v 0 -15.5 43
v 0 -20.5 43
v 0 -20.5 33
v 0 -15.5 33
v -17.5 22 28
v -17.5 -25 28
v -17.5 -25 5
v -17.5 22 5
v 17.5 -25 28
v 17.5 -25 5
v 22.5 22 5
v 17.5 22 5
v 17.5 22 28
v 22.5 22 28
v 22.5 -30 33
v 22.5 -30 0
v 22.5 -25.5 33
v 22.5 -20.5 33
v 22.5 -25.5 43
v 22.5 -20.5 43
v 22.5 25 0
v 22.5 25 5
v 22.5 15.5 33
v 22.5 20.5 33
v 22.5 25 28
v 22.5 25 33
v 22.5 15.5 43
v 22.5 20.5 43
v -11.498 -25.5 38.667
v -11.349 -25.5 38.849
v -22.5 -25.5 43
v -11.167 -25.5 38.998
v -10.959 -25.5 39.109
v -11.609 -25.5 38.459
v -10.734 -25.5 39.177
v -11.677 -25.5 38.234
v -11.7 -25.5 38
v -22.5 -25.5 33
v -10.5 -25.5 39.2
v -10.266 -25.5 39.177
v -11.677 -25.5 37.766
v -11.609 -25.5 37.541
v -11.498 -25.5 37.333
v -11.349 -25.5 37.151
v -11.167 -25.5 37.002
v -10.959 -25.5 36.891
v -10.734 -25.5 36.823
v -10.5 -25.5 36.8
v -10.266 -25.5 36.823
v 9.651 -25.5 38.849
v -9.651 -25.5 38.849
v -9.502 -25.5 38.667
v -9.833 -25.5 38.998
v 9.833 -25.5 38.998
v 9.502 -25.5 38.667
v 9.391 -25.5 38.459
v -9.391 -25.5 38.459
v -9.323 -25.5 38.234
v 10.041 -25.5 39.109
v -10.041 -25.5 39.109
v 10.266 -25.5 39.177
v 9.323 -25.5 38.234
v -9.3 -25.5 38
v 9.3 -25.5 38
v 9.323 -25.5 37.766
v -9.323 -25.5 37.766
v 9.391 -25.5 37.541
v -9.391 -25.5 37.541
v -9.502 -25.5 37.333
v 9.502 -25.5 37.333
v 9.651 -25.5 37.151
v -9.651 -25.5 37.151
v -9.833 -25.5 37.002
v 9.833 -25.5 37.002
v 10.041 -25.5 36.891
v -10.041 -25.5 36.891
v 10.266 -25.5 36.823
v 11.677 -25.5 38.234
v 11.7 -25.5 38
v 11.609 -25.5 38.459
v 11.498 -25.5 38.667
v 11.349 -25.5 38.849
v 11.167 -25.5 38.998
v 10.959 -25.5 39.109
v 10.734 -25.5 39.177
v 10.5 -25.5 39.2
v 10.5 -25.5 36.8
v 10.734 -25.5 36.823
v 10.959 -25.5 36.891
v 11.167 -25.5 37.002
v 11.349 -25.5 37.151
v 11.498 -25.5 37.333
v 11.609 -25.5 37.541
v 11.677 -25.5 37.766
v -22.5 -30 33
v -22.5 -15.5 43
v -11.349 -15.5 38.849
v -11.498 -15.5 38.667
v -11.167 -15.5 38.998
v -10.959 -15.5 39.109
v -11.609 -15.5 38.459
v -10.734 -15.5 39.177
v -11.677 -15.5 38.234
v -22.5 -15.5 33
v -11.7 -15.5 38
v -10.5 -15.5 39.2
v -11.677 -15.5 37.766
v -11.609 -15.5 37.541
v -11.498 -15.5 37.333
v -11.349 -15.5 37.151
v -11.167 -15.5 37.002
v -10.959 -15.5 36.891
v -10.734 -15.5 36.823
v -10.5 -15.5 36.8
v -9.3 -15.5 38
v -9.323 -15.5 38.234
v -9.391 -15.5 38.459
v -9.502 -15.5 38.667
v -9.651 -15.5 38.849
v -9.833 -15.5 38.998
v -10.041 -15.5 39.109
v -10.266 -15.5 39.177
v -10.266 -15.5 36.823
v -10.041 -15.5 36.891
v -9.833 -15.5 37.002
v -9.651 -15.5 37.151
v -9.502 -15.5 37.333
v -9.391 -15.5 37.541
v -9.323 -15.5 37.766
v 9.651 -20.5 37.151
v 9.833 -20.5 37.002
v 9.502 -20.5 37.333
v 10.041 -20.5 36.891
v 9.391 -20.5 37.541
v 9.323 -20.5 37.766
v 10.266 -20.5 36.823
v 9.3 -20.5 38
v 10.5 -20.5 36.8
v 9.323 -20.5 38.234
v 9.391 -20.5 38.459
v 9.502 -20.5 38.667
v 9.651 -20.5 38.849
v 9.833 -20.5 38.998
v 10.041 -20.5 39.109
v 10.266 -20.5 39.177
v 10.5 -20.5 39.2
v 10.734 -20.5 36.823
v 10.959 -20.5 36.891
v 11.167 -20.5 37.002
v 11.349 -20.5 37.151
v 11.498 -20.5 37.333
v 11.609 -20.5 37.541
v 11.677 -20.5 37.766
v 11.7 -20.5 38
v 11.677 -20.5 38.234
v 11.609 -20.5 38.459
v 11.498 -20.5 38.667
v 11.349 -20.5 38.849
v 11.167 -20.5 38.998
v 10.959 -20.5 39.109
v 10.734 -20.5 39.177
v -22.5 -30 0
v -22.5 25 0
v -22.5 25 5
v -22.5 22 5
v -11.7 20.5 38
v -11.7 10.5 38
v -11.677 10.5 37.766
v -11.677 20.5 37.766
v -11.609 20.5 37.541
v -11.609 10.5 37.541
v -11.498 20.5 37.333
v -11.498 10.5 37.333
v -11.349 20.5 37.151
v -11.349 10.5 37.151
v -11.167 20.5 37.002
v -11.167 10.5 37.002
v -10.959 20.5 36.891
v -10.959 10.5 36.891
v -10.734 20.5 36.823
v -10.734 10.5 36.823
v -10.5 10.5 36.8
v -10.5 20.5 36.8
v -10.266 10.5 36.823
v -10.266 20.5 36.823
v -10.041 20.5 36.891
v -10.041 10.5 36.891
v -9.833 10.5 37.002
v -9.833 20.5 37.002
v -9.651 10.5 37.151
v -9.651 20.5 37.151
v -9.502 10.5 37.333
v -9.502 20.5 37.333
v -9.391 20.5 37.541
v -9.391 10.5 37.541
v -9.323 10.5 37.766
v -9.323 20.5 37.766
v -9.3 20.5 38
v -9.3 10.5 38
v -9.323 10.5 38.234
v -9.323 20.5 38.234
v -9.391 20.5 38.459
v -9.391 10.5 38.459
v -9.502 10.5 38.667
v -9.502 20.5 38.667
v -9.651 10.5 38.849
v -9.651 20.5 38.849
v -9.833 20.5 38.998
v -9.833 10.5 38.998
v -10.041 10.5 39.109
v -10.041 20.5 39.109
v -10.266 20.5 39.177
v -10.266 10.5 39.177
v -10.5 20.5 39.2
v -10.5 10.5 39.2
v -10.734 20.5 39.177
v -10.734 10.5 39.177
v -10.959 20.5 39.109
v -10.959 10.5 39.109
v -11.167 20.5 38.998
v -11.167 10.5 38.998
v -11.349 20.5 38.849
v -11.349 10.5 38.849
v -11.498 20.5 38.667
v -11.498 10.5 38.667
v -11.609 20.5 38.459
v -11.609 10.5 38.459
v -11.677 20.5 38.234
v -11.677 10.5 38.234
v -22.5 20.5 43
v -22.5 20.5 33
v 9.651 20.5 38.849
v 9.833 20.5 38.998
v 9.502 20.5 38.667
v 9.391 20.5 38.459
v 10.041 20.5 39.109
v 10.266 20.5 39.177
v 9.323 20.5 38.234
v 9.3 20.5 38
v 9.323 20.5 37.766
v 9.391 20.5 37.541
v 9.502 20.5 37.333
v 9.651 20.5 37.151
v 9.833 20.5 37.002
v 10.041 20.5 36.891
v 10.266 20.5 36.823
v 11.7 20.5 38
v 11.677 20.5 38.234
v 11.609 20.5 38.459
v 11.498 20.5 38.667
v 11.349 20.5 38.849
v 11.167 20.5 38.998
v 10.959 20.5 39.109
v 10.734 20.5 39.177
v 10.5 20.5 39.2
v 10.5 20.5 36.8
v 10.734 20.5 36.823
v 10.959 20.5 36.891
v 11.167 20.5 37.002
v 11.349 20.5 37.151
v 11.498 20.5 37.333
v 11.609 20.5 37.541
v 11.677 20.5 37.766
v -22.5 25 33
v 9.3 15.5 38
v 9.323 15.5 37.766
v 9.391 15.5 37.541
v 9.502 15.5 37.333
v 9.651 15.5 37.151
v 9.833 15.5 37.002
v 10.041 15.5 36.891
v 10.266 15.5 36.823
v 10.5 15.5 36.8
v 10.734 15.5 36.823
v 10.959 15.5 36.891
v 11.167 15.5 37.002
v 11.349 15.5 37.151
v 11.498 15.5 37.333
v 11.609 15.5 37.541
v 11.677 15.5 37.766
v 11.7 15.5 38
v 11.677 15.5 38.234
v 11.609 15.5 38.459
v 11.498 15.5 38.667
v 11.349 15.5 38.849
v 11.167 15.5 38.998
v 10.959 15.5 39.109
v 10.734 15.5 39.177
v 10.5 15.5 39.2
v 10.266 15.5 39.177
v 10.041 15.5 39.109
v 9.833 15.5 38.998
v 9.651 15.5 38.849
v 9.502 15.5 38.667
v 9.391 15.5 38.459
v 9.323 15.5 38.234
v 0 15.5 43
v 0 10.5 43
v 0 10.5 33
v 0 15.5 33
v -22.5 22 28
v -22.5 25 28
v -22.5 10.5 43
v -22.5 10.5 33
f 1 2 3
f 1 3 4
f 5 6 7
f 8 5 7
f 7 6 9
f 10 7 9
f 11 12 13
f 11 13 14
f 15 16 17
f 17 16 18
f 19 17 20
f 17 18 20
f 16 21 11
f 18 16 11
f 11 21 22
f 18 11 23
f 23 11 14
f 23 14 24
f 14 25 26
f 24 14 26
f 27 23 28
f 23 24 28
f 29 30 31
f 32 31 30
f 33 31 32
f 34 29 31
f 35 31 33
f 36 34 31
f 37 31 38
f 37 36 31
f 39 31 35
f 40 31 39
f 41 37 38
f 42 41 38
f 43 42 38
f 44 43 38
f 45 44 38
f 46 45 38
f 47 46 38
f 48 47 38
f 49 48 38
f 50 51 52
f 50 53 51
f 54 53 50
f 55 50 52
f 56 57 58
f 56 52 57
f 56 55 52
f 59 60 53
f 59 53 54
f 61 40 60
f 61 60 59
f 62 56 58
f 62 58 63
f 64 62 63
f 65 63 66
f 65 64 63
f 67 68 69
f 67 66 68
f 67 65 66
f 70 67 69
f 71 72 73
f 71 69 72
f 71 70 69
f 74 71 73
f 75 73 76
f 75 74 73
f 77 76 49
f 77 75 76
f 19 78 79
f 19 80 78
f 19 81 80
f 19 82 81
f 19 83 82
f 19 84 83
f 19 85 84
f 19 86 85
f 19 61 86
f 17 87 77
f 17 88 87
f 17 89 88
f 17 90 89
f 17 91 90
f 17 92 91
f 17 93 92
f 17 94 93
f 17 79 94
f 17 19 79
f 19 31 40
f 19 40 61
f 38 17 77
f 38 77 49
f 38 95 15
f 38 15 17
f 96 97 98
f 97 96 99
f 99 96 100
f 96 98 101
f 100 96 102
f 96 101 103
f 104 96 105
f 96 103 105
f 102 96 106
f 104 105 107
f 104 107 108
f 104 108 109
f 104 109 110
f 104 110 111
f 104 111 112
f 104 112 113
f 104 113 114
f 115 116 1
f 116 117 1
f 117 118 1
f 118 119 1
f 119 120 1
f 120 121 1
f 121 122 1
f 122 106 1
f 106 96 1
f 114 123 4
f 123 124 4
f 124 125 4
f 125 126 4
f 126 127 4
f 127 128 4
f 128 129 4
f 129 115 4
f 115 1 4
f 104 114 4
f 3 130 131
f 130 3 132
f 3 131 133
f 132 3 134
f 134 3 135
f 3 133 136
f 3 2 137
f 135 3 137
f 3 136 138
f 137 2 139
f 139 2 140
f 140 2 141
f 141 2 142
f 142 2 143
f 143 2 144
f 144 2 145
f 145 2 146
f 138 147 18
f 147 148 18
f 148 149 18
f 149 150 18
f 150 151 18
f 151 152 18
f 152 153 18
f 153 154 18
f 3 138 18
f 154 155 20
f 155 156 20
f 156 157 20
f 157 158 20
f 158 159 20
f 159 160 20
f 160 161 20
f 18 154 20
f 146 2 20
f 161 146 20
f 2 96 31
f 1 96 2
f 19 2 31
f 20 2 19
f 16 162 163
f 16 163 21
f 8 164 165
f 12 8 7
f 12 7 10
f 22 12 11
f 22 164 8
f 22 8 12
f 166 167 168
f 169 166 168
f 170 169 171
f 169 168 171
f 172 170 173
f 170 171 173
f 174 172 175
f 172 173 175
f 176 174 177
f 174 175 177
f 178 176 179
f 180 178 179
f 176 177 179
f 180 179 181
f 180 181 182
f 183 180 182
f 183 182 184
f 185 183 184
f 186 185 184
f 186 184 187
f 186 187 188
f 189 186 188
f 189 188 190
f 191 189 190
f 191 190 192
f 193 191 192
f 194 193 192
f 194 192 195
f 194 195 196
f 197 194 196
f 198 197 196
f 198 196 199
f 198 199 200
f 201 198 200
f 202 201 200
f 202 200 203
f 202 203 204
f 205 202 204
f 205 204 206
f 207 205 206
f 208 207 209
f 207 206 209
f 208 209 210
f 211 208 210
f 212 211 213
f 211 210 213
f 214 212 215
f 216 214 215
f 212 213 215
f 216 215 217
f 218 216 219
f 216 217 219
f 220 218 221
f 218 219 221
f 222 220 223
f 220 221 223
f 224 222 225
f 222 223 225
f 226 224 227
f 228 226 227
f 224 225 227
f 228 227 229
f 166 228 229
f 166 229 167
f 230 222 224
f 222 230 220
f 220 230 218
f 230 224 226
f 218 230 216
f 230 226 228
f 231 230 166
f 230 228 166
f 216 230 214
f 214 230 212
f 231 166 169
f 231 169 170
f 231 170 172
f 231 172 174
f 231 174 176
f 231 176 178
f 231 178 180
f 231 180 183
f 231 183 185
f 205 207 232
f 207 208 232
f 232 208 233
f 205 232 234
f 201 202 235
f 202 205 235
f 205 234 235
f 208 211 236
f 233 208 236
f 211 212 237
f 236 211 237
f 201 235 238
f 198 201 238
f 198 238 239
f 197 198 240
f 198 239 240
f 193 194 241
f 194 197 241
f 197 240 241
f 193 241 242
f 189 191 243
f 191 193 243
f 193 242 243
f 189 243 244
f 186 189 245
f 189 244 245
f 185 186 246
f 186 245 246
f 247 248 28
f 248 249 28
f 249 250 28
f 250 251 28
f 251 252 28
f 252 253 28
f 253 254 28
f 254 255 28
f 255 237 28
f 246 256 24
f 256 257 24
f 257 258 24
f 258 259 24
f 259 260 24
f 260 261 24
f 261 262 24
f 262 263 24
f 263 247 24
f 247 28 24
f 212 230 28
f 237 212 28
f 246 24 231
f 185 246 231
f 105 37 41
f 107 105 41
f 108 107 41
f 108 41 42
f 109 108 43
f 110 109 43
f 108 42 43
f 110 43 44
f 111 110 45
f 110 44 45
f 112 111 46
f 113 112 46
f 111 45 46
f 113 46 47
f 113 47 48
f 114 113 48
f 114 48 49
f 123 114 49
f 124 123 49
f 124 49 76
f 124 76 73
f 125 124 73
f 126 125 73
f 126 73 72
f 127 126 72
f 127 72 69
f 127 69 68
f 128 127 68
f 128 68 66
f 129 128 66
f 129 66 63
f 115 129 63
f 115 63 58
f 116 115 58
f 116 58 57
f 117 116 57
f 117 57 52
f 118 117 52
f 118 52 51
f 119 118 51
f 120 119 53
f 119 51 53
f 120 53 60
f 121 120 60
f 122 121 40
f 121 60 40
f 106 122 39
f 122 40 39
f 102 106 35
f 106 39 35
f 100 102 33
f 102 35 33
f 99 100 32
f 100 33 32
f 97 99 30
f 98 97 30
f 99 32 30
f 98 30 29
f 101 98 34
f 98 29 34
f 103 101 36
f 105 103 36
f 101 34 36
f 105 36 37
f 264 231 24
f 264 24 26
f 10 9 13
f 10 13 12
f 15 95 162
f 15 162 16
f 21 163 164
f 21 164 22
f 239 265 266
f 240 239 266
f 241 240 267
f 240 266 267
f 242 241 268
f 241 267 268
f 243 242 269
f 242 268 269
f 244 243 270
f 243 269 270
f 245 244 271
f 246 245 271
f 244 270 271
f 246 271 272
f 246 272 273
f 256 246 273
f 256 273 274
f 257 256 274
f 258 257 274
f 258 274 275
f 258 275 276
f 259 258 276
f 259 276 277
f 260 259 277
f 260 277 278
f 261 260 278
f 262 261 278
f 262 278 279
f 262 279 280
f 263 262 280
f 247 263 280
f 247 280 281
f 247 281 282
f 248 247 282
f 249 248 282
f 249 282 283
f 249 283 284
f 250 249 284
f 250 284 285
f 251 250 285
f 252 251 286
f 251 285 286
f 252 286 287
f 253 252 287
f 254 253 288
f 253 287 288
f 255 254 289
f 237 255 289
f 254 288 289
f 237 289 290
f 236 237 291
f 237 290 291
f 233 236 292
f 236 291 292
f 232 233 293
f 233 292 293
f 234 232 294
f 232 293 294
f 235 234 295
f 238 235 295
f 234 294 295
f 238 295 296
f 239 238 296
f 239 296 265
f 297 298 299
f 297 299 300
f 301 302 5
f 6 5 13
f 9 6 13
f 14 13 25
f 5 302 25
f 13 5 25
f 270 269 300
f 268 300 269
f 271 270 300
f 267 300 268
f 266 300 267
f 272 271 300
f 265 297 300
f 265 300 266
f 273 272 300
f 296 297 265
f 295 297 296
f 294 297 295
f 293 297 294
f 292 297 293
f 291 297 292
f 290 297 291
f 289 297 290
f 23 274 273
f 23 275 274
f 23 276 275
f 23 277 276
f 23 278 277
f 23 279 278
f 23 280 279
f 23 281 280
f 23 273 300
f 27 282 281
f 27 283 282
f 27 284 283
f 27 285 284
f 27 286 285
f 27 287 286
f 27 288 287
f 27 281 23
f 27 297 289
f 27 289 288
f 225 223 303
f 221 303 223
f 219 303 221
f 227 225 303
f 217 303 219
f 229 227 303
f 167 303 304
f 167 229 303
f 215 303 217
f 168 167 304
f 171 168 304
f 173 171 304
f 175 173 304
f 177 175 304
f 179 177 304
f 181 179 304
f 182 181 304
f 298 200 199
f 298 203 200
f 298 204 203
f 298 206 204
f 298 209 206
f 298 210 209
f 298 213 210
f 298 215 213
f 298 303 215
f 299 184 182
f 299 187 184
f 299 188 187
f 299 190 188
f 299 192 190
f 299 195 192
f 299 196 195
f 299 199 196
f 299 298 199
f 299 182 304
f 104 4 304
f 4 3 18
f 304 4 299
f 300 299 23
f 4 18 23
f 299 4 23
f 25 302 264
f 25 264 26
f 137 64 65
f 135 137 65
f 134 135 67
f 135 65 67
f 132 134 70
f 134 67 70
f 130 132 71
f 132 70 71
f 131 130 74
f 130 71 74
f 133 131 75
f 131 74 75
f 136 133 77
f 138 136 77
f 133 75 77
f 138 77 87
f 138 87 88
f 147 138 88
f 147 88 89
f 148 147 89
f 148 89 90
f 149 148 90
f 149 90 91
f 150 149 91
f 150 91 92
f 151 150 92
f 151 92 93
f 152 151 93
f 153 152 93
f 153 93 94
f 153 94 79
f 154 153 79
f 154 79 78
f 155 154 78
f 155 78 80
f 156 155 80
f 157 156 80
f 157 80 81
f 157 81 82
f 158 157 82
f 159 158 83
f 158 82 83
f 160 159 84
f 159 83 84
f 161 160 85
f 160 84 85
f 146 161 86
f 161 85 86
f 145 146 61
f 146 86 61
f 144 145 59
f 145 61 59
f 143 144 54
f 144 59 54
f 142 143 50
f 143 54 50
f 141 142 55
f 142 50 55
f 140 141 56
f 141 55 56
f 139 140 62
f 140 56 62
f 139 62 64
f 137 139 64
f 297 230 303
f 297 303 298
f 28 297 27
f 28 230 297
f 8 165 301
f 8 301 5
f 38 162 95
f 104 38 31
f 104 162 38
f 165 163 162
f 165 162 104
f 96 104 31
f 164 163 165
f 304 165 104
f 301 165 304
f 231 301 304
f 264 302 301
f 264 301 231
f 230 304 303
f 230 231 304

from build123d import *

# Parameters (mm, degrees)
SKETCH_1_W          = 45
SKETCH_1_H          = 50
EXTRUDE_1_DEPTH     = 43
SKETCH_2_W          = 35
SKETCH_2_H          = 23
CUT_EXTRUDE_1_DEPTH = 70.679623994
SKETCH_3_W          = 45
SKETCH_3_H          = 43
EXTRUDE_2_DEPTH     = 5
SKETCH_4_W          = 10
SKETCH_4_H          = 26
SKETCH_4_H_2        = 4.5
CUT_EXTRUDE_2_DEPTH = 70.09413868
SKETCH_5_W          = 22.5
SKETCH_5_H          = 5
CUT_EXTRUDE_3_DEPTH = 10
HOLE_WIZARD_M2_1_D  = 2.4
SKETCH_8_W          = 45
SKETCH_8_H          = 23
CUT_EXTRUDE_4_DEPTH = 3
CUT_EXTRUDE_5_REACH = 59.055
SKETCH_11_W         = 22.5
SKETCH_11_H         = 5


with BuildPart() as part:
    # ｽｹｯﾁ1 → ﾎﾞｽ - 押し出し1 (new body)
    with BuildSketch(Plane.XY):
        Rectangle(SKETCH_1_W, SKETCH_1_H)
    extrude(amount=EXTRUDE_1_DEPTH)

    # ｽｹｯﾁ2 → ｶｯﾄ - 押し出し1 (cut, through all)
    with BuildSketch(Plane(origin=(0, 25, 0), x_dir=(1, 0, 0), z_dir=(0, 1, 0))):
        with Locations((0, -16.5)):
            Rectangle(SKETCH_2_W, SKETCH_2_H)
    extrude(amount=-CUT_EXTRUDE_1_DEPTH, mode=Mode.SUBTRACT)

    # ｽｹｯﾁ3 → ﾎﾞｽ - 押し出し2 (add)
    with BuildSketch(Plane.XZ.offset(25)):
        with Locations((0, 21.5)):
            Rectangle(SKETCH_3_W, SKETCH_3_H)
    extrude(amount=EXTRUDE_2_DEPTH)

    # ｽｹｯﾁ4 → ｶｯﾄ - 押し出し2 (cut, through all)
    with BuildSketch(Plane(origin=(22.5, 0, 0), x_dir=(0, 0, -1), z_dir=(1, 0, 0))):
        with Locations((-38, -2.5)):
            Rectangle(SKETCH_4_W, SKETCH_4_H)
        with Locations((-38, -27.75)):
            Rectangle(SKETCH_4_W, SKETCH_4_H_2)
        with Locations((-38, 22.75)):
            Rectangle(SKETCH_4_W, SKETCH_4_H_2)
    extrude(amount=-CUT_EXTRUDE_2_DEPTH, mode=Mode.SUBTRACT)

    # ｽｹｯﾁ5 → ｶｯﾄ - 押し出し3 (cut)
    with BuildSketch(Plane.XY.offset(43)):
        with Locations((11.25, 13)):
            Rectangle(SKETCH_5_W, SKETCH_5_H)
    extrude(amount=-CUT_EXTRUDE_3_DEPTH, mode=Mode.SUBTRACT)

    # M2 すきま穴1 (through all)
    with Locations(Plane(origin=(0, 20.5, 0), x_dir=(1, 0, 0), z_dir=(0, 1, 0))):
        with Locations((-10.5, -38), (10.5, -38)):
            Hole(HOLE_WIZARD_M2_1_D / 2)

    # ｽｹｯﾁ8 → ｶｯﾄ - 押し出し4 (cut)
    with BuildSketch(Plane(origin=(0, 25, 0), x_dir=(1, 0, 0), z_dir=(0, 1, 0))):
        with Locations((0, -16.5)):
            Rectangle(SKETCH_8_W, SKETCH_8_H)
    extrude(amount=-CUT_EXTRUDE_4_DEPTH, mode=Mode.SUBTRACT)

    # ｶｯﾄ - 押し出し5: up to this face of the body (flat: up to its plane)
    cut_extrude_5_end = Plane(part.part.faces().sort_by_distance((0.986842105, -1.140350877, 33))[0])
    # ｽｹｯﾁ11 → ｶｯﾄ - 押し出し5 (cut, up to the picked face)
    with BuildSketch(Plane.XY.offset(43), mode=Mode.PRIVATE) as cut_extrude_5_sk1:
        with Locations((11.25, -18)):
            Rectangle(SKETCH_11_W, SKETCH_11_H)
    cut_extrude_5_tool1 = split(extrude(cut_extrude_5_sk1.sketch, amount=-CUT_EXTRUDE_5_REACH, mode=Mode.PRIVATE), bisect_by=cut_extrude_5_end, keep=Keep.BOTH, mode=Mode.PRIVATE)
    add(cut_extrude_5_tool1.solids().sort_by(Axis((11.25, -18, 43), (0, 0, -1)))[0], mode=Mode.SUBTRACT)


solid = part.part
